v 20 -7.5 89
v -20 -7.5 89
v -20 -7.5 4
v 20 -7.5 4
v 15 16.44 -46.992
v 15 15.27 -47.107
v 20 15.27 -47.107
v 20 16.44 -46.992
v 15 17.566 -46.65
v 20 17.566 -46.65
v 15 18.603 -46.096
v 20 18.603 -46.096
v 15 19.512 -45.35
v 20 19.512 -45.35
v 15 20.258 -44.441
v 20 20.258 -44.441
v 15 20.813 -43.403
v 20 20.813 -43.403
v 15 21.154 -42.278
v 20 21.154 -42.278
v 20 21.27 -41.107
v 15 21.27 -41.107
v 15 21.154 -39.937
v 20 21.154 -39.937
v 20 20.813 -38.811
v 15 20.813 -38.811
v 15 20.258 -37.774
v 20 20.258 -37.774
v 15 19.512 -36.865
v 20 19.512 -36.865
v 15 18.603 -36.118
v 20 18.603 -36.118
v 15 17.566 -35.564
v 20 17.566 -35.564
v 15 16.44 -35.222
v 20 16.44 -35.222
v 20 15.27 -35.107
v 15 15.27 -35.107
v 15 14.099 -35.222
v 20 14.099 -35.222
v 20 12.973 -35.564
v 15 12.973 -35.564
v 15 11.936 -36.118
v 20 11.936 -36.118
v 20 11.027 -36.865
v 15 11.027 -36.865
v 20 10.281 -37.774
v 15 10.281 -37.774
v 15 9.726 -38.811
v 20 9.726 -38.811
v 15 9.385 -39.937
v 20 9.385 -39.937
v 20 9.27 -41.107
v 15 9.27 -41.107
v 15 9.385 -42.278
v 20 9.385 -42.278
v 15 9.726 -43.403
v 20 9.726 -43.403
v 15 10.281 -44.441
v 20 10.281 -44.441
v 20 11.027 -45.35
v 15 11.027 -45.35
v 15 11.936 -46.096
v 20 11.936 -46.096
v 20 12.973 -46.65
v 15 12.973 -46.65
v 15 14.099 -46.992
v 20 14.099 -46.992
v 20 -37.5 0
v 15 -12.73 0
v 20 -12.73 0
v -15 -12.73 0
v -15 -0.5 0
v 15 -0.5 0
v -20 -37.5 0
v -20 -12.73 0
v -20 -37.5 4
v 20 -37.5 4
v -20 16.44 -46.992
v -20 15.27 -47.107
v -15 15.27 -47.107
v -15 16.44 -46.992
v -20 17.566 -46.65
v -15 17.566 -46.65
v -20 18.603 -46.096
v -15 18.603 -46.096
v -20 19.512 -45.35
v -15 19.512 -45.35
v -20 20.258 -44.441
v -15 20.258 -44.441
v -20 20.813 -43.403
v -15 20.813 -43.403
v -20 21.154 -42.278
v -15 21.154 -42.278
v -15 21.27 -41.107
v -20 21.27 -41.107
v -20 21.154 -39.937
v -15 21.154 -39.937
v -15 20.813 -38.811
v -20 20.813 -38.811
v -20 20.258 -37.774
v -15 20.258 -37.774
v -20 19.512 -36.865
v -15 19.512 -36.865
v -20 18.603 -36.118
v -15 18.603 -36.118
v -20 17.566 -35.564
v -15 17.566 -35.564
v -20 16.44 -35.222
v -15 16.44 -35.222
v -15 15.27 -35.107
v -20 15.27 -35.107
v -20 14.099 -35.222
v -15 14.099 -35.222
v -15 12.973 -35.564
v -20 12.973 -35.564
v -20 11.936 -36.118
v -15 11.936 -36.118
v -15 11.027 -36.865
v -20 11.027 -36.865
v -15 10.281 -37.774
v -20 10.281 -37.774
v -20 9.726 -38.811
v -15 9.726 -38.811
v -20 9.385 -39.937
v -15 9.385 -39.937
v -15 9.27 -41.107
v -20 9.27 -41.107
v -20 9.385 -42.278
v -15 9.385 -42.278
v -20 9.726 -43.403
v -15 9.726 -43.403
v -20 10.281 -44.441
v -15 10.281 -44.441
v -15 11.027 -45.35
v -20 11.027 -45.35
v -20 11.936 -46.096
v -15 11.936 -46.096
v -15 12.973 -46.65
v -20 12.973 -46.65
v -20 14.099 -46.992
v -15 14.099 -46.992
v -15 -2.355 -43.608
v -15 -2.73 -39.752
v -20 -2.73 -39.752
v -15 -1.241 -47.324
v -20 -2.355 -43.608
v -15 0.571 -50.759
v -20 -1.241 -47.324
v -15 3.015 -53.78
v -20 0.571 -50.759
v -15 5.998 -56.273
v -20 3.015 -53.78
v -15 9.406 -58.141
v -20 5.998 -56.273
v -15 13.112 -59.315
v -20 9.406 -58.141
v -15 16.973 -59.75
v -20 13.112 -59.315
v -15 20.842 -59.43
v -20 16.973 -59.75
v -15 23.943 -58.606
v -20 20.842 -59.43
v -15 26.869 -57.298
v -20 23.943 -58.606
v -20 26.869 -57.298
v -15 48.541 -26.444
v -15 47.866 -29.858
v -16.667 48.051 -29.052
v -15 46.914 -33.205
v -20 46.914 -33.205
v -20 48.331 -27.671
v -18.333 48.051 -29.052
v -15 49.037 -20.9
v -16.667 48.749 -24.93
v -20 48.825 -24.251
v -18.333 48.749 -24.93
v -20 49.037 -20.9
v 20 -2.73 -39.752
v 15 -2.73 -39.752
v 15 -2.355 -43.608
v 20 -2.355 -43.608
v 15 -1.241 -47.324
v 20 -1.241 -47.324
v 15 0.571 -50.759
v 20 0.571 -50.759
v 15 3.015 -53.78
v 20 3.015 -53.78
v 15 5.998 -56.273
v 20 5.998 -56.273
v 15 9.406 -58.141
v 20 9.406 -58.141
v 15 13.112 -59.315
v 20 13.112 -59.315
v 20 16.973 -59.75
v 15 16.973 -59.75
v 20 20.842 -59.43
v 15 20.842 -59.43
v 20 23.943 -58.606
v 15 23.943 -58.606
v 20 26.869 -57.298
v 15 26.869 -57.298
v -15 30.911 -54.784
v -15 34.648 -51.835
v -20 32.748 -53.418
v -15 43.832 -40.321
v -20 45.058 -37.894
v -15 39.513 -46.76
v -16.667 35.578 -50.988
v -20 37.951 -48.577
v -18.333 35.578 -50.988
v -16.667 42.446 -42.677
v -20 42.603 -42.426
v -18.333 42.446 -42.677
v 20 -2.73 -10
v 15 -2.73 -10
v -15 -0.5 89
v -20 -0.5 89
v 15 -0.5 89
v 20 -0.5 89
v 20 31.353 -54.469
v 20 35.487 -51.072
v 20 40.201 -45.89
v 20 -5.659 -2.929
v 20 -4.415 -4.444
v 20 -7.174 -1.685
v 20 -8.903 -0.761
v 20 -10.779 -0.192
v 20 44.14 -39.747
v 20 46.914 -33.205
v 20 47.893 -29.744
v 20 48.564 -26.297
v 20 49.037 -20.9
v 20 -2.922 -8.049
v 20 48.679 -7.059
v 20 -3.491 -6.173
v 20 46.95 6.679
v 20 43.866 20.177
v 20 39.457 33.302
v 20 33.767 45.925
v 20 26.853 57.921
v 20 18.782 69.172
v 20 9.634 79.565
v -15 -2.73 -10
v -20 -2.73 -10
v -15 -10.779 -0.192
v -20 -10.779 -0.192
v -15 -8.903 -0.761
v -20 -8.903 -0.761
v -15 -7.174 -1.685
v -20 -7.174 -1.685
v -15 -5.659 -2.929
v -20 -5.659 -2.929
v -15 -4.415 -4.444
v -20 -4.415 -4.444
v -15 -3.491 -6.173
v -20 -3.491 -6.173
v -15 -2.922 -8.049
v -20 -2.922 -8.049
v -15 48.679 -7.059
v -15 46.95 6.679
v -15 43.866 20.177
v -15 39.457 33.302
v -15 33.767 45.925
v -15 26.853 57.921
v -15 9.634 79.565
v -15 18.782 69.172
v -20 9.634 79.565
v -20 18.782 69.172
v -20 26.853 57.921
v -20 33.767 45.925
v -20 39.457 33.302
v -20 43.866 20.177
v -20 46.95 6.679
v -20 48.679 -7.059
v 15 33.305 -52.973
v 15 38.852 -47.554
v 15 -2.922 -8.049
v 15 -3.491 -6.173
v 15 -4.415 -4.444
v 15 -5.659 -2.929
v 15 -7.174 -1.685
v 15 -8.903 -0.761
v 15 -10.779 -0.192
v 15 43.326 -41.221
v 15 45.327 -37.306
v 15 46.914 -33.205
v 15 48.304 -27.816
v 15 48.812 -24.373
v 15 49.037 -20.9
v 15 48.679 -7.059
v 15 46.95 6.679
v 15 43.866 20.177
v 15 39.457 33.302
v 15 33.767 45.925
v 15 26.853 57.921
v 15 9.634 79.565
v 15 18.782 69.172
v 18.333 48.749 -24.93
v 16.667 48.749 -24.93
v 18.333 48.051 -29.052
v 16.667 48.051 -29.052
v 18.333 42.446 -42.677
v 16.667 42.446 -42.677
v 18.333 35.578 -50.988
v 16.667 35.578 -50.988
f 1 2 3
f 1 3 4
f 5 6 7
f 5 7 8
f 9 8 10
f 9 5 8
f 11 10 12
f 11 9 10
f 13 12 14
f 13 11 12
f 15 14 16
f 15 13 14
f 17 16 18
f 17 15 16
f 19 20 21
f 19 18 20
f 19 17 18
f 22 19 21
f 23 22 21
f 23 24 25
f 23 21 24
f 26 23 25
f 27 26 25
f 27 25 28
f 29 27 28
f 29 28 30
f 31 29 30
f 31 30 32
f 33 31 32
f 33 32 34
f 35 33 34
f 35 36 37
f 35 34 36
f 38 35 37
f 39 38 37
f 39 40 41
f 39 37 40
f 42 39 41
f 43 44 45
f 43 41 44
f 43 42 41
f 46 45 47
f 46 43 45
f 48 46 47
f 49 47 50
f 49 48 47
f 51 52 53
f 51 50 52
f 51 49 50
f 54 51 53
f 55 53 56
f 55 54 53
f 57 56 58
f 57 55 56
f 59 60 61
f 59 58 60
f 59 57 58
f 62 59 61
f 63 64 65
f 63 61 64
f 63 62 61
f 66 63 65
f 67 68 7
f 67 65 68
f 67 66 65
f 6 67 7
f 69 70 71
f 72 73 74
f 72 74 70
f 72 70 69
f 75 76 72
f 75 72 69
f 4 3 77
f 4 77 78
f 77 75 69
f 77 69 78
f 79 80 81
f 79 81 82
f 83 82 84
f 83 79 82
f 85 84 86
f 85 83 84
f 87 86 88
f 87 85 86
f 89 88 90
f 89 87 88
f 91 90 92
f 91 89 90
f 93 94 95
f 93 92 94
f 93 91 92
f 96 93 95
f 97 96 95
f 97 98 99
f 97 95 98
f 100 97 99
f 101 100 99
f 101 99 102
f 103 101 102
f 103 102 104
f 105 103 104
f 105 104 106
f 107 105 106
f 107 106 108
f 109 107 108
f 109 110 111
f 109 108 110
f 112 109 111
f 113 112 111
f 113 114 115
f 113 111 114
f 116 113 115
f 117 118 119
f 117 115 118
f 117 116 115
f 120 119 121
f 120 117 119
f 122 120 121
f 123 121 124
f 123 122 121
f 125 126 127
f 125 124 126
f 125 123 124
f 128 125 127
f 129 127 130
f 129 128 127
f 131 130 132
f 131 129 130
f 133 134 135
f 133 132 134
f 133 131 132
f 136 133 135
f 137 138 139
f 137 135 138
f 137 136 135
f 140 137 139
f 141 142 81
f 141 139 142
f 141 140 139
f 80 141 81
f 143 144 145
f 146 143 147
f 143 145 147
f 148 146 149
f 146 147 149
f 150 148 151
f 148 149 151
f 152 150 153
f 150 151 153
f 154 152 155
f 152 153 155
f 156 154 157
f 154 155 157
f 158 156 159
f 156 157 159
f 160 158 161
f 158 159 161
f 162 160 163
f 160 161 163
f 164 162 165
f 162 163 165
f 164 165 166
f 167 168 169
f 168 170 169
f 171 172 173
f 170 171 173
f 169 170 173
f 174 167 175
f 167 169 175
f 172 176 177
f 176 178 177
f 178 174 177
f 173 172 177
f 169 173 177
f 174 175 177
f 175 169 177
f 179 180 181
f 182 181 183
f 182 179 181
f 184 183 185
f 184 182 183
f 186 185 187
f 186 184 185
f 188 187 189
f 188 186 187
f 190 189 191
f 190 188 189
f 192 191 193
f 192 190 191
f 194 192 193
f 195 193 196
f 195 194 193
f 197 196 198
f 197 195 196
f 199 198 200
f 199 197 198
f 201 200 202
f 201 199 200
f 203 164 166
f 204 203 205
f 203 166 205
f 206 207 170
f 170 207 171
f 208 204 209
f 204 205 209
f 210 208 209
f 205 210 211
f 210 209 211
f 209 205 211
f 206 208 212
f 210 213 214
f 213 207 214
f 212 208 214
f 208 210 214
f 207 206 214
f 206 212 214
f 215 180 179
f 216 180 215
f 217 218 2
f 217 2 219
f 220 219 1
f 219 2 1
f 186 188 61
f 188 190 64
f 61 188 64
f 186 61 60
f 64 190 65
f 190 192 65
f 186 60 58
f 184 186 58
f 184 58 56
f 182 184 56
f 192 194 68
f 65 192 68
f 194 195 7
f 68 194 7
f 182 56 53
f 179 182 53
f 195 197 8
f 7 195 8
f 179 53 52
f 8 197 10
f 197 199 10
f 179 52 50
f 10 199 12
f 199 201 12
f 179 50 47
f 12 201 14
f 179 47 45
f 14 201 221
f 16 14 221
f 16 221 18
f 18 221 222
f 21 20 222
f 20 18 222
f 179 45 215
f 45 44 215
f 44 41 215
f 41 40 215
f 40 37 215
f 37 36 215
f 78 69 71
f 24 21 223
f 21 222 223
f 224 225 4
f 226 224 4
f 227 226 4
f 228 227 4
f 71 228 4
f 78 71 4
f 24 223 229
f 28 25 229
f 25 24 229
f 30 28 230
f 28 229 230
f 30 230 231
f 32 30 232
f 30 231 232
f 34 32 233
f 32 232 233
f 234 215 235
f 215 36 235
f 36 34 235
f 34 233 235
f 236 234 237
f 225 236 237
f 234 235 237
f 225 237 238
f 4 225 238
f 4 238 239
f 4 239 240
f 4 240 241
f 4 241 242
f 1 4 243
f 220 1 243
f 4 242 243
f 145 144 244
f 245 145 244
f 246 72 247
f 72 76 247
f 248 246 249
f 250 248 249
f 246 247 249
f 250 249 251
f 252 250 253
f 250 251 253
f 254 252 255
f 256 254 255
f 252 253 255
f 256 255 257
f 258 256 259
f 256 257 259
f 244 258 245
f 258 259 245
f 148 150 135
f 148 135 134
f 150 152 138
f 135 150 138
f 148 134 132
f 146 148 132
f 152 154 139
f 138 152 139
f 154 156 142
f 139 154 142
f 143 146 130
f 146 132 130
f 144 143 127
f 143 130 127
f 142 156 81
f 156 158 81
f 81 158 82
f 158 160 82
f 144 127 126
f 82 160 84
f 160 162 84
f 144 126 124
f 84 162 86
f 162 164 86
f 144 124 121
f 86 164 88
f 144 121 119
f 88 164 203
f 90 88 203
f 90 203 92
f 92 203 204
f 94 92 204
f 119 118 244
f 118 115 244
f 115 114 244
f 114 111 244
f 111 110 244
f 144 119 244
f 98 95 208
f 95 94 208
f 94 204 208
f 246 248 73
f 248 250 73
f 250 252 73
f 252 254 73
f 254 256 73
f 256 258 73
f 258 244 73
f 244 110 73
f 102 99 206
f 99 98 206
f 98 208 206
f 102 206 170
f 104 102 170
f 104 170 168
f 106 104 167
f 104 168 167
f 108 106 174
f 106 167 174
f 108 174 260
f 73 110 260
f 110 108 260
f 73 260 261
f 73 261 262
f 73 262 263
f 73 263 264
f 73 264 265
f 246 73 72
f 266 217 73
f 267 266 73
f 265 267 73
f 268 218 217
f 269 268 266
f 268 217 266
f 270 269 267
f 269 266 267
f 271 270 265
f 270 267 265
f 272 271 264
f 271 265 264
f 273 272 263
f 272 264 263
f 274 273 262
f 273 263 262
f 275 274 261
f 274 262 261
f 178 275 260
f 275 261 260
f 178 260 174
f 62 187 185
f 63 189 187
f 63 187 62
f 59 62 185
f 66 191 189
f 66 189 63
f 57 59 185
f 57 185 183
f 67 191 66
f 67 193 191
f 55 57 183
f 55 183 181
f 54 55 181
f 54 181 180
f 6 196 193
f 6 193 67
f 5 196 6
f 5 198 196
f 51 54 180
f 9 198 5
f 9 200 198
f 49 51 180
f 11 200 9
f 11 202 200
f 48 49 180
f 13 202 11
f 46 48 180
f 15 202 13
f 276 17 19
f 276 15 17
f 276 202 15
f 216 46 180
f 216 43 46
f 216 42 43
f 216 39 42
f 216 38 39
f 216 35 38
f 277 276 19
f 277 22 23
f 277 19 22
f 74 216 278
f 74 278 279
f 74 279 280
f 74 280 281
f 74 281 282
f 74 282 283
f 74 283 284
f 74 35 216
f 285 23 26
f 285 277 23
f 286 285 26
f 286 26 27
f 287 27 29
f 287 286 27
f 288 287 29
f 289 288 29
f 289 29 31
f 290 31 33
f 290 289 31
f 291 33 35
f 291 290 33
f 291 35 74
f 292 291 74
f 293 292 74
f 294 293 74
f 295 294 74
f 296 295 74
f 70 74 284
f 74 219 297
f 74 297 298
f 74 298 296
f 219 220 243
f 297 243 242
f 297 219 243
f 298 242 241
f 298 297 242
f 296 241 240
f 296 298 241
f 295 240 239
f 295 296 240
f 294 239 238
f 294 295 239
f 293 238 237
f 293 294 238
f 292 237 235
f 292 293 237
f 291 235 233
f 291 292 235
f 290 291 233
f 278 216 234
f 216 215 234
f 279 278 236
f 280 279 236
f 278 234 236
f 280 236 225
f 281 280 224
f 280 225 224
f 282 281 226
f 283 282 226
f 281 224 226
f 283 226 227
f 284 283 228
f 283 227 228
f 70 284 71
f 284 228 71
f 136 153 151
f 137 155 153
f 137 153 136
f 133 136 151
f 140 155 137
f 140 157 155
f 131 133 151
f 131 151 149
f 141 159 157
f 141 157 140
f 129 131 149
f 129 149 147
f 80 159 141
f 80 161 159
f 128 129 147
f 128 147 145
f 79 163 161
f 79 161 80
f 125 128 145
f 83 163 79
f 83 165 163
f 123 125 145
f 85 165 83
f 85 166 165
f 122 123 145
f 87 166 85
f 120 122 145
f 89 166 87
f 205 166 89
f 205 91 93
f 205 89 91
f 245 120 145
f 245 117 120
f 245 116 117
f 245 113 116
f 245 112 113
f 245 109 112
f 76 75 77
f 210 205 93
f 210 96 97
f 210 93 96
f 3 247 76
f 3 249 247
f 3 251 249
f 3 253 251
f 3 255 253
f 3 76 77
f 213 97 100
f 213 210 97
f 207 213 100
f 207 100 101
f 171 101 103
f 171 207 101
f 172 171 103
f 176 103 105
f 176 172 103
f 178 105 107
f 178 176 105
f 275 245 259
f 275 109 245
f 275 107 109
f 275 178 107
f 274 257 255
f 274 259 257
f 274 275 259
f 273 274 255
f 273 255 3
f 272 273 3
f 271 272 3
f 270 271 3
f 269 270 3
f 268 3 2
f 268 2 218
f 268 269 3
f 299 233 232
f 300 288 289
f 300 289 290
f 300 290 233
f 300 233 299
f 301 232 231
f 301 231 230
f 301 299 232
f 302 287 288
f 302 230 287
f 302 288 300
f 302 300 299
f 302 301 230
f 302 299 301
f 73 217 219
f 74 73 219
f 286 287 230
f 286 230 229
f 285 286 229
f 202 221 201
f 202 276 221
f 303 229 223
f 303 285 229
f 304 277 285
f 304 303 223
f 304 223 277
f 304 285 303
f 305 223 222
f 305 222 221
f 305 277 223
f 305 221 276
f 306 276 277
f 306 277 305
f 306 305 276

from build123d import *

# Parameters (mm, degrees)
SZKIC1_W                        = 30
SZKIC1_H                        = 75
DODANIE_WYCI_GNI_CIE1_DEPTH     = 4
DODANIE_WYCI_GNI_CIE9_DEPTH     = 5
ZAOKR_GLENIE4_START             = -20
ZAOKR_GLENIE4_DEPTH             = 6
ZAOKR_GLENIE7_START             = 14
ZAOKR_GLENIE7_DEPTH             = 6
SZKIC12_W                       = 30
SZKIC12_H                       = 85
DODANIE_WYCI_GNI_CIE14_DEPTH    = 7
SZKIC13_W                       = 30
SZKIC13_H                       = 38
WYTNIJ_WYCI_GNI_CIE3_DEPTH      = 10
ZAOKR_GLENIE10_R                = 20
WYTNIJ_WYCI_GNI_CIE4_DEPTH      = 108.491901733
WYTNIJ_WYCI_GNI_CIE4_DEPTH_BACK = 108.491901733
SZKIC16_R                       = 6
ZAOKR_GLENIE11_R                = 10


with BuildPart() as part:
    # Szkic1 → Dodanie-wyciągnięcie1 (new body)
    with BuildSketch(Plane.XY):
        Rectangle(SZKIC1_W, SZKIC1_H)
    extrude(amount=DODANIE_WYCI_GNI_CIE1_DEPTH)

    # Szkic2<6> → Dodanie-wyciągnięcie9 (add)
    with BuildSketch(Plane.ZY.offset(15)):
        with BuildLine():
            Line((-62.531345503, -2.73), (0, -2.73))
            Line((0, -2.73), (0, -37.5))
            Line((0, -37.5), (4, -37.5))
            Line((4, -37.5), (4, -7.5))
            Line((4, -7.5), (89, -7.5))
            Line((89, -7.5), (89, -0.5))
            ThreePointArc((89, -0.5), (36.533874177, 38.142707909), (-27.765672752, 48.703081871))
            Line((-27.765672752, 48.703081871), (-62.531345503, 37.27))
            Line((-62.531345503, 37.27), (-62.531345503, -2.73))
        make_face()
    dodanie_wyci_gni_cie9 = extrude(amount=DODANIE_WYCI_GNI_CIE9_DEPTH)

    # Zaokrąglenie4: read off the stored shape, not the designer's step
    # Zaokrąglenie4 outline → Zaokrąglenie4 (cut)
    with BuildSketch(Plane.YZ.offset(ZAOKR_GLENIE4_START)):
        with BuildLine():
            add(Edge.make_bspline(
                [(46.914284354, -33.205041576), (48.244794, -29.159256091), (48.938225425, -25.023538595), (49.036781903, -20.899990656)],
                knots=[0.800219325, 0.800219325, 0.800219325, 0.800219325, 1, 1, 1, 1], degree=3, weights=[0.909036421, 0.931787704, 0.962108897, 1]))
            Line((46.914284354, -33.205041576), (48.703081871, -27.765672752))
            ThreePointArc((48.703081871, -27.765672752), (48.912277268, -24.334889862), (49.036781903, -20.899990656))
        make_face()
        with BuildLine():
            add(Edge.make_bspline(
                [(6.398511186, -62.531345503), (25.138203193, -62.531345503), (40.842910838, -51.666745261), (46.914284354, -33.205041576)],
                knots=[0, 0, 0, 0, 0.800219325, 0.800219325, 0.800219325, 0.800219325], degree=3, weights=[1, 0.848227597, 0.817906404, 0.909036421]))
            Line((6.398511186, -62.531345503), (37.27, -62.531345503))
            Line((37.27, -62.531345503), (46.914284354, -33.205041576))
        make_face()
    extrude(amount=ZAOKR_GLENIE4_DEPTH, mode=Mode.SUBTRACT)

    # Lustro2: Dodanie-wyciągnięcie9 across plane
    add(dodanie_wyci_gni_cie9.mirror(Plane(origin=(0, 0, 0), x_dir=(0, 0, 1), z_dir=(1, 0, 0))))

    # Zaokrąglenie7: read off the stored shape, not the designer's step
    # Zaokrąglenie7 outline → Zaokrąglenie7 (cut)
    with BuildSketch(Plane.YZ.offset(ZAOKR_GLENIE7_START)):
        with BuildLine():
            ThreePointArc((48.703081871, -27.765672752), (48.912277268, -24.334889862), (49.036781903, -20.899990656))
            add(Edge.make_bspline(
                [(49.036781903, -20.899990656), (48.938225459, -25.023537174), (48.244794476, -29.159253258), (46.914285711, -33.205037449)],
                knots=[0, 0, 0, 0, 0.199780609, 0.199780609, 0.199780609, 0.199780609], degree=3, weights=[1, 0.962108909, 0.931787724, 0.909036443]))
            Line((46.914285711, -33.205037449), (48.703081871, -27.765672752))
        make_face()
        with BuildLine():
            Line((37.27, -62.531345503), (46.914285711, -33.205037449))
            add(Edge.make_bspline(
                [(46.914285711, -33.205037449), (40.842913536, -51.666743395), (25.138205022, -62.531345503), (6.398511186, -62.531345503)],
                knots=[0.199780609, 0.199780609, 0.199780609, 0.199780609, 1, 1, 1, 1], degree=3, weights=[0.909036443, 0.817906399, 0.848227585, 1]))
            Line((6.398511186, -62.531345503), (37.27, -62.531345503))
        make_face()
    extrude(amount=ZAOKR_GLENIE7_DEPTH, mode=Mode.SUBTRACT)

    # Szkic12 → Dodanie-wyciągnięcie14 (add)
    with BuildSketch(Plane.XZ.offset(7.5)):
        with Locations((0, 46.5)):
            Rectangle(SZKIC12_W, SZKIC12_H)
    extrude(amount=-DODANIE_WYCI_GNI_CIE14_DEPTH)

    # Szkic13 → Wytnij-wyciągnięcie3 (cut)
    with BuildSketch(Plane.XY.offset(4)):
        with Locations((0, 18.5)):
            Rectangle(SZKIC13_W, SZKIC13_H)
    extrude(amount=-WYTNIJ_WYCI_GNI_CIE3_DEPTH, mode=Mode.SUBTRACT)

    # Zaokrąglenie10
    zaokr_glenie10_edges = [part.edges().sort_by_distance(p)[0] for p in [
        (17.5, -2.73, -62.531345503),
        (-17.5, -2.73, -62.531345503),
    ]]
    fillet(zaokr_glenie10_edges, radius=ZAOKR_GLENIE10_R)

    # Szkic16 → Wytnij-wyciągnięcie4 (cut, two sides: drawn at the far end of the back side and taken through both)
    with BuildSketch(Plane(origin=(-15, 0, 0), x_dir=(0, 0, -1), z_dir=(1, 0, 0)).offset(-WYTNIJ_WYCI_GNI_CIE4_DEPTH_BACK)):
        with Locations((41.107158155, 15.269526453)):
            Circle(SZKIC16_R)
    extrude(amount=WYTNIJ_WYCI_GNI_CIE4_DEPTH + WYTNIJ_WYCI_GNI_CIE4_DEPTH_BACK, mode=Mode.SUBTRACT)

    # Zaokrąglenie11
    zaokr_glenie11_edges = [part.edges().sort_by_distance(p)[0] for p in [
        (-17.5, -2.73, 0),
        (17.5, -2.73, 0),
    ]]
    fillet(zaokr_glenie11_edges, radius=ZAOKR_GLENIE11_R)


solid = part.part
